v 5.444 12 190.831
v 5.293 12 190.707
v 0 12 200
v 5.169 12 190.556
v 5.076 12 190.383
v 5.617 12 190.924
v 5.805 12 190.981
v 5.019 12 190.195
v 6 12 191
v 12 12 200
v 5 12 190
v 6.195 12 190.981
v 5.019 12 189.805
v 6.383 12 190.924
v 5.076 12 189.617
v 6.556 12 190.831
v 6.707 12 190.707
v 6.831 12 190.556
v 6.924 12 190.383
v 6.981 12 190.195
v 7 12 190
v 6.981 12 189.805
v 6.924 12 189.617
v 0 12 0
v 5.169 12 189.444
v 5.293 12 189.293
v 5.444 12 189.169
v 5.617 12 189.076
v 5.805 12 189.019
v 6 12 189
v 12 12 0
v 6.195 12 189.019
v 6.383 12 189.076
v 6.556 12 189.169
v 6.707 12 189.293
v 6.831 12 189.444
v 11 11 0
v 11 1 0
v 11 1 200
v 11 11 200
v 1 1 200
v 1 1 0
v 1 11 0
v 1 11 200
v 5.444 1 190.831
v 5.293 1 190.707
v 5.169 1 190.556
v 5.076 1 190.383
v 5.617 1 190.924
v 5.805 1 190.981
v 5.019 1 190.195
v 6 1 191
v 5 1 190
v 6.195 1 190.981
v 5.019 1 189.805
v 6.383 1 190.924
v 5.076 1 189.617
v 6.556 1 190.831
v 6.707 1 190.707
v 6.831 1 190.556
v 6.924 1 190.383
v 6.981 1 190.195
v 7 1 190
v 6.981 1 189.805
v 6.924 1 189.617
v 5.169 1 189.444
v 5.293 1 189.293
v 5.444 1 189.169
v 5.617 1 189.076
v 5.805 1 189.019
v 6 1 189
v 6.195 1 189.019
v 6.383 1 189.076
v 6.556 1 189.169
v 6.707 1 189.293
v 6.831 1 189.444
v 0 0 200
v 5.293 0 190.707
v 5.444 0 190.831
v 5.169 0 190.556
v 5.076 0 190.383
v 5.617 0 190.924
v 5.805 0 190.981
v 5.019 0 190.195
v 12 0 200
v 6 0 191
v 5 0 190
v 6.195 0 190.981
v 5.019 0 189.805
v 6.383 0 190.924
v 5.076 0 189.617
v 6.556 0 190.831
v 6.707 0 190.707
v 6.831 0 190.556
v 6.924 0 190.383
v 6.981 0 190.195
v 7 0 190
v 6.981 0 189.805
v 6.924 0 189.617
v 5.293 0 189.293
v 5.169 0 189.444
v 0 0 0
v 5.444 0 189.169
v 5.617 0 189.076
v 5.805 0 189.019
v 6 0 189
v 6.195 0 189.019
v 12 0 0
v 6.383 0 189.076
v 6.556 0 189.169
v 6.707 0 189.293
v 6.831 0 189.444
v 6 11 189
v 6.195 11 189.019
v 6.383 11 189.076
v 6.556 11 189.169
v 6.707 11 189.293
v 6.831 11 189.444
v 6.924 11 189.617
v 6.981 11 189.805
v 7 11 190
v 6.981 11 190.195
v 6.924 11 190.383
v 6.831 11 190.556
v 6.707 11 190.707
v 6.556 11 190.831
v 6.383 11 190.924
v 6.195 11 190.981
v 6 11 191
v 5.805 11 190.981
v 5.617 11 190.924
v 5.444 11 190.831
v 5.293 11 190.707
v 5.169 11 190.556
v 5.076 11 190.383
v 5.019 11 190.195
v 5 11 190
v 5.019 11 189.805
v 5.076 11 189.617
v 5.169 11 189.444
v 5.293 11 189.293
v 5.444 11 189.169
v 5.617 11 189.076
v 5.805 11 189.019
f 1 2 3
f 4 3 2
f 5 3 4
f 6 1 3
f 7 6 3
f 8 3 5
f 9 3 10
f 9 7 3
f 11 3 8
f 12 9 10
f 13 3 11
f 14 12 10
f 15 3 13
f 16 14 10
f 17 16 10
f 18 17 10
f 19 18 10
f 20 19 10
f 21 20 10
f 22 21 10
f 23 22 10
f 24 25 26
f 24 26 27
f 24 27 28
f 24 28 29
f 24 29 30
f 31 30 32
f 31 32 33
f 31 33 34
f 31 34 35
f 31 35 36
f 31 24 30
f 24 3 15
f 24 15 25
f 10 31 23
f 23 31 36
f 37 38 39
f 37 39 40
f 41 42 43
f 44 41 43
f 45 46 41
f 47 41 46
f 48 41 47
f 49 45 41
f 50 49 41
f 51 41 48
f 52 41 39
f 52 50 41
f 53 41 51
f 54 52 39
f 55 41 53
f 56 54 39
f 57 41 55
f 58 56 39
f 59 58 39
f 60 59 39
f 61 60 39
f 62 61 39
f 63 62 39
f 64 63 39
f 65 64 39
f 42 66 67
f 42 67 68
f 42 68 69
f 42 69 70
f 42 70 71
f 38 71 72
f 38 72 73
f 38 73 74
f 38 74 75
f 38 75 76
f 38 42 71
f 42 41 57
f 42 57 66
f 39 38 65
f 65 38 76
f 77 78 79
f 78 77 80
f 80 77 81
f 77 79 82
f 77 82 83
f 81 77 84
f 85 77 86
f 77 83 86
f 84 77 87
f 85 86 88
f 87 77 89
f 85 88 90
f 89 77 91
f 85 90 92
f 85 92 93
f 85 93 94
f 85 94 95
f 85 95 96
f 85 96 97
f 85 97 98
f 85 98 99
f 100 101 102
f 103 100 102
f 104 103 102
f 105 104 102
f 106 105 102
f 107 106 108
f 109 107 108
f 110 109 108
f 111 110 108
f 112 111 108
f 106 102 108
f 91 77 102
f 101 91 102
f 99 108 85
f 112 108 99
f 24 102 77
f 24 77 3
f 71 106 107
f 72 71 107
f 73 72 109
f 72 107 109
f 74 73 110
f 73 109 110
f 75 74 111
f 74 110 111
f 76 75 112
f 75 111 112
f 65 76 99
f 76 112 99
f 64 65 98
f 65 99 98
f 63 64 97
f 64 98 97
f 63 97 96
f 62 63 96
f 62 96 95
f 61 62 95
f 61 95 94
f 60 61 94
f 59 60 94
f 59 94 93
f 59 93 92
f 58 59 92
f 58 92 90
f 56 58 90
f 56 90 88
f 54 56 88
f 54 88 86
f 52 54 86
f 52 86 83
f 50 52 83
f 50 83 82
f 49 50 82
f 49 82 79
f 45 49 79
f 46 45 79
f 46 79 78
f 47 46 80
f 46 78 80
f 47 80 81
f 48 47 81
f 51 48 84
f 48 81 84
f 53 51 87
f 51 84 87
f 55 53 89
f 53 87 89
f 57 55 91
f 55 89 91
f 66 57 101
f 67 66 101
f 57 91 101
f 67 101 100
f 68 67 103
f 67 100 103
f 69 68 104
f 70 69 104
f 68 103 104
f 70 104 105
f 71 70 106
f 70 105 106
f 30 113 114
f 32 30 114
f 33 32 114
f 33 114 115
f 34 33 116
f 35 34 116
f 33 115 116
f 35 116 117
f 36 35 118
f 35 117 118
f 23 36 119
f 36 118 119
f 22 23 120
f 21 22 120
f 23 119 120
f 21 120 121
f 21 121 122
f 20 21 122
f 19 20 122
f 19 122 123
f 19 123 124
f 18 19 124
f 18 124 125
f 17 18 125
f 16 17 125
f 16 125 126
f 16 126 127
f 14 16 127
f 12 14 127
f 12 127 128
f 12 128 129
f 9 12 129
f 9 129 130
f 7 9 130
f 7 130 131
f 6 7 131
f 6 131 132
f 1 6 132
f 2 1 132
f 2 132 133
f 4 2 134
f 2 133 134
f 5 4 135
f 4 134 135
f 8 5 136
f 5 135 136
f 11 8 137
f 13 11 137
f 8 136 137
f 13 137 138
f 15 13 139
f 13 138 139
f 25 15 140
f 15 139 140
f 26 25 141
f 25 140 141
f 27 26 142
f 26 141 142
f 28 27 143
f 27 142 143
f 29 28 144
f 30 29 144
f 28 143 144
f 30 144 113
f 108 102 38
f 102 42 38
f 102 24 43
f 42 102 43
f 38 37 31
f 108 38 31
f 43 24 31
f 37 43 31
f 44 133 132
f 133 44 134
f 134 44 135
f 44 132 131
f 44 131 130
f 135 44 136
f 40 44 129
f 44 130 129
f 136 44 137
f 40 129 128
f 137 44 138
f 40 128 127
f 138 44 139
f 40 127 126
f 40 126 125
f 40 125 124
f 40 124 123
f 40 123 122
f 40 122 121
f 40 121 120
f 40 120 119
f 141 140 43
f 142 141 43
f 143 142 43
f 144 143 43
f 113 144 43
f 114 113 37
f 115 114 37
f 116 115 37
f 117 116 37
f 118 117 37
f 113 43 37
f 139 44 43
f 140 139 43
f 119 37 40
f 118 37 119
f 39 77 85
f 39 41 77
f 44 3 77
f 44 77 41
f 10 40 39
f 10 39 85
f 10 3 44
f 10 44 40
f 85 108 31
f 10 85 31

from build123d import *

# Parameters (mm, degrees)
SKETCH_1_W          = 12
SKETCH_1_H          = 12
SKETCH_1_W_2        = 10
SKETCH_1_H_2        = 10
EXTRUDE_1_DEPTH     = 200
SKETCH_2_R          = 1
CUT_EXTRUDE_1_DEPTH = 12


with BuildPart() as part:
    # 草图1 → 凸台-拉伸1 (new body)
    with BuildSketch(Plane.XY):
        with Locations((6, 6)):
            Rectangle(SKETCH_1_W, SKETCH_1_H)
        with Locations((6, 6)):
            Rectangle(SKETCH_1_W_2, SKETCH_1_H_2, mode=Mode.SUBTRACT)
    extrude(amount=EXTRUDE_1_DEPTH)

    # 草图2 → 切除-拉伸1 (cut)
    with BuildSketch(Plane.XZ):
        with Locations(Location((6, 190, 0), (0, 0, 270))):
            Circle(SKETCH_2_R)
    extrude(amount=-CUT_EXTRUDE_1_DEPTH, mode=Mode.SUBTRACT)


solid = part.part
